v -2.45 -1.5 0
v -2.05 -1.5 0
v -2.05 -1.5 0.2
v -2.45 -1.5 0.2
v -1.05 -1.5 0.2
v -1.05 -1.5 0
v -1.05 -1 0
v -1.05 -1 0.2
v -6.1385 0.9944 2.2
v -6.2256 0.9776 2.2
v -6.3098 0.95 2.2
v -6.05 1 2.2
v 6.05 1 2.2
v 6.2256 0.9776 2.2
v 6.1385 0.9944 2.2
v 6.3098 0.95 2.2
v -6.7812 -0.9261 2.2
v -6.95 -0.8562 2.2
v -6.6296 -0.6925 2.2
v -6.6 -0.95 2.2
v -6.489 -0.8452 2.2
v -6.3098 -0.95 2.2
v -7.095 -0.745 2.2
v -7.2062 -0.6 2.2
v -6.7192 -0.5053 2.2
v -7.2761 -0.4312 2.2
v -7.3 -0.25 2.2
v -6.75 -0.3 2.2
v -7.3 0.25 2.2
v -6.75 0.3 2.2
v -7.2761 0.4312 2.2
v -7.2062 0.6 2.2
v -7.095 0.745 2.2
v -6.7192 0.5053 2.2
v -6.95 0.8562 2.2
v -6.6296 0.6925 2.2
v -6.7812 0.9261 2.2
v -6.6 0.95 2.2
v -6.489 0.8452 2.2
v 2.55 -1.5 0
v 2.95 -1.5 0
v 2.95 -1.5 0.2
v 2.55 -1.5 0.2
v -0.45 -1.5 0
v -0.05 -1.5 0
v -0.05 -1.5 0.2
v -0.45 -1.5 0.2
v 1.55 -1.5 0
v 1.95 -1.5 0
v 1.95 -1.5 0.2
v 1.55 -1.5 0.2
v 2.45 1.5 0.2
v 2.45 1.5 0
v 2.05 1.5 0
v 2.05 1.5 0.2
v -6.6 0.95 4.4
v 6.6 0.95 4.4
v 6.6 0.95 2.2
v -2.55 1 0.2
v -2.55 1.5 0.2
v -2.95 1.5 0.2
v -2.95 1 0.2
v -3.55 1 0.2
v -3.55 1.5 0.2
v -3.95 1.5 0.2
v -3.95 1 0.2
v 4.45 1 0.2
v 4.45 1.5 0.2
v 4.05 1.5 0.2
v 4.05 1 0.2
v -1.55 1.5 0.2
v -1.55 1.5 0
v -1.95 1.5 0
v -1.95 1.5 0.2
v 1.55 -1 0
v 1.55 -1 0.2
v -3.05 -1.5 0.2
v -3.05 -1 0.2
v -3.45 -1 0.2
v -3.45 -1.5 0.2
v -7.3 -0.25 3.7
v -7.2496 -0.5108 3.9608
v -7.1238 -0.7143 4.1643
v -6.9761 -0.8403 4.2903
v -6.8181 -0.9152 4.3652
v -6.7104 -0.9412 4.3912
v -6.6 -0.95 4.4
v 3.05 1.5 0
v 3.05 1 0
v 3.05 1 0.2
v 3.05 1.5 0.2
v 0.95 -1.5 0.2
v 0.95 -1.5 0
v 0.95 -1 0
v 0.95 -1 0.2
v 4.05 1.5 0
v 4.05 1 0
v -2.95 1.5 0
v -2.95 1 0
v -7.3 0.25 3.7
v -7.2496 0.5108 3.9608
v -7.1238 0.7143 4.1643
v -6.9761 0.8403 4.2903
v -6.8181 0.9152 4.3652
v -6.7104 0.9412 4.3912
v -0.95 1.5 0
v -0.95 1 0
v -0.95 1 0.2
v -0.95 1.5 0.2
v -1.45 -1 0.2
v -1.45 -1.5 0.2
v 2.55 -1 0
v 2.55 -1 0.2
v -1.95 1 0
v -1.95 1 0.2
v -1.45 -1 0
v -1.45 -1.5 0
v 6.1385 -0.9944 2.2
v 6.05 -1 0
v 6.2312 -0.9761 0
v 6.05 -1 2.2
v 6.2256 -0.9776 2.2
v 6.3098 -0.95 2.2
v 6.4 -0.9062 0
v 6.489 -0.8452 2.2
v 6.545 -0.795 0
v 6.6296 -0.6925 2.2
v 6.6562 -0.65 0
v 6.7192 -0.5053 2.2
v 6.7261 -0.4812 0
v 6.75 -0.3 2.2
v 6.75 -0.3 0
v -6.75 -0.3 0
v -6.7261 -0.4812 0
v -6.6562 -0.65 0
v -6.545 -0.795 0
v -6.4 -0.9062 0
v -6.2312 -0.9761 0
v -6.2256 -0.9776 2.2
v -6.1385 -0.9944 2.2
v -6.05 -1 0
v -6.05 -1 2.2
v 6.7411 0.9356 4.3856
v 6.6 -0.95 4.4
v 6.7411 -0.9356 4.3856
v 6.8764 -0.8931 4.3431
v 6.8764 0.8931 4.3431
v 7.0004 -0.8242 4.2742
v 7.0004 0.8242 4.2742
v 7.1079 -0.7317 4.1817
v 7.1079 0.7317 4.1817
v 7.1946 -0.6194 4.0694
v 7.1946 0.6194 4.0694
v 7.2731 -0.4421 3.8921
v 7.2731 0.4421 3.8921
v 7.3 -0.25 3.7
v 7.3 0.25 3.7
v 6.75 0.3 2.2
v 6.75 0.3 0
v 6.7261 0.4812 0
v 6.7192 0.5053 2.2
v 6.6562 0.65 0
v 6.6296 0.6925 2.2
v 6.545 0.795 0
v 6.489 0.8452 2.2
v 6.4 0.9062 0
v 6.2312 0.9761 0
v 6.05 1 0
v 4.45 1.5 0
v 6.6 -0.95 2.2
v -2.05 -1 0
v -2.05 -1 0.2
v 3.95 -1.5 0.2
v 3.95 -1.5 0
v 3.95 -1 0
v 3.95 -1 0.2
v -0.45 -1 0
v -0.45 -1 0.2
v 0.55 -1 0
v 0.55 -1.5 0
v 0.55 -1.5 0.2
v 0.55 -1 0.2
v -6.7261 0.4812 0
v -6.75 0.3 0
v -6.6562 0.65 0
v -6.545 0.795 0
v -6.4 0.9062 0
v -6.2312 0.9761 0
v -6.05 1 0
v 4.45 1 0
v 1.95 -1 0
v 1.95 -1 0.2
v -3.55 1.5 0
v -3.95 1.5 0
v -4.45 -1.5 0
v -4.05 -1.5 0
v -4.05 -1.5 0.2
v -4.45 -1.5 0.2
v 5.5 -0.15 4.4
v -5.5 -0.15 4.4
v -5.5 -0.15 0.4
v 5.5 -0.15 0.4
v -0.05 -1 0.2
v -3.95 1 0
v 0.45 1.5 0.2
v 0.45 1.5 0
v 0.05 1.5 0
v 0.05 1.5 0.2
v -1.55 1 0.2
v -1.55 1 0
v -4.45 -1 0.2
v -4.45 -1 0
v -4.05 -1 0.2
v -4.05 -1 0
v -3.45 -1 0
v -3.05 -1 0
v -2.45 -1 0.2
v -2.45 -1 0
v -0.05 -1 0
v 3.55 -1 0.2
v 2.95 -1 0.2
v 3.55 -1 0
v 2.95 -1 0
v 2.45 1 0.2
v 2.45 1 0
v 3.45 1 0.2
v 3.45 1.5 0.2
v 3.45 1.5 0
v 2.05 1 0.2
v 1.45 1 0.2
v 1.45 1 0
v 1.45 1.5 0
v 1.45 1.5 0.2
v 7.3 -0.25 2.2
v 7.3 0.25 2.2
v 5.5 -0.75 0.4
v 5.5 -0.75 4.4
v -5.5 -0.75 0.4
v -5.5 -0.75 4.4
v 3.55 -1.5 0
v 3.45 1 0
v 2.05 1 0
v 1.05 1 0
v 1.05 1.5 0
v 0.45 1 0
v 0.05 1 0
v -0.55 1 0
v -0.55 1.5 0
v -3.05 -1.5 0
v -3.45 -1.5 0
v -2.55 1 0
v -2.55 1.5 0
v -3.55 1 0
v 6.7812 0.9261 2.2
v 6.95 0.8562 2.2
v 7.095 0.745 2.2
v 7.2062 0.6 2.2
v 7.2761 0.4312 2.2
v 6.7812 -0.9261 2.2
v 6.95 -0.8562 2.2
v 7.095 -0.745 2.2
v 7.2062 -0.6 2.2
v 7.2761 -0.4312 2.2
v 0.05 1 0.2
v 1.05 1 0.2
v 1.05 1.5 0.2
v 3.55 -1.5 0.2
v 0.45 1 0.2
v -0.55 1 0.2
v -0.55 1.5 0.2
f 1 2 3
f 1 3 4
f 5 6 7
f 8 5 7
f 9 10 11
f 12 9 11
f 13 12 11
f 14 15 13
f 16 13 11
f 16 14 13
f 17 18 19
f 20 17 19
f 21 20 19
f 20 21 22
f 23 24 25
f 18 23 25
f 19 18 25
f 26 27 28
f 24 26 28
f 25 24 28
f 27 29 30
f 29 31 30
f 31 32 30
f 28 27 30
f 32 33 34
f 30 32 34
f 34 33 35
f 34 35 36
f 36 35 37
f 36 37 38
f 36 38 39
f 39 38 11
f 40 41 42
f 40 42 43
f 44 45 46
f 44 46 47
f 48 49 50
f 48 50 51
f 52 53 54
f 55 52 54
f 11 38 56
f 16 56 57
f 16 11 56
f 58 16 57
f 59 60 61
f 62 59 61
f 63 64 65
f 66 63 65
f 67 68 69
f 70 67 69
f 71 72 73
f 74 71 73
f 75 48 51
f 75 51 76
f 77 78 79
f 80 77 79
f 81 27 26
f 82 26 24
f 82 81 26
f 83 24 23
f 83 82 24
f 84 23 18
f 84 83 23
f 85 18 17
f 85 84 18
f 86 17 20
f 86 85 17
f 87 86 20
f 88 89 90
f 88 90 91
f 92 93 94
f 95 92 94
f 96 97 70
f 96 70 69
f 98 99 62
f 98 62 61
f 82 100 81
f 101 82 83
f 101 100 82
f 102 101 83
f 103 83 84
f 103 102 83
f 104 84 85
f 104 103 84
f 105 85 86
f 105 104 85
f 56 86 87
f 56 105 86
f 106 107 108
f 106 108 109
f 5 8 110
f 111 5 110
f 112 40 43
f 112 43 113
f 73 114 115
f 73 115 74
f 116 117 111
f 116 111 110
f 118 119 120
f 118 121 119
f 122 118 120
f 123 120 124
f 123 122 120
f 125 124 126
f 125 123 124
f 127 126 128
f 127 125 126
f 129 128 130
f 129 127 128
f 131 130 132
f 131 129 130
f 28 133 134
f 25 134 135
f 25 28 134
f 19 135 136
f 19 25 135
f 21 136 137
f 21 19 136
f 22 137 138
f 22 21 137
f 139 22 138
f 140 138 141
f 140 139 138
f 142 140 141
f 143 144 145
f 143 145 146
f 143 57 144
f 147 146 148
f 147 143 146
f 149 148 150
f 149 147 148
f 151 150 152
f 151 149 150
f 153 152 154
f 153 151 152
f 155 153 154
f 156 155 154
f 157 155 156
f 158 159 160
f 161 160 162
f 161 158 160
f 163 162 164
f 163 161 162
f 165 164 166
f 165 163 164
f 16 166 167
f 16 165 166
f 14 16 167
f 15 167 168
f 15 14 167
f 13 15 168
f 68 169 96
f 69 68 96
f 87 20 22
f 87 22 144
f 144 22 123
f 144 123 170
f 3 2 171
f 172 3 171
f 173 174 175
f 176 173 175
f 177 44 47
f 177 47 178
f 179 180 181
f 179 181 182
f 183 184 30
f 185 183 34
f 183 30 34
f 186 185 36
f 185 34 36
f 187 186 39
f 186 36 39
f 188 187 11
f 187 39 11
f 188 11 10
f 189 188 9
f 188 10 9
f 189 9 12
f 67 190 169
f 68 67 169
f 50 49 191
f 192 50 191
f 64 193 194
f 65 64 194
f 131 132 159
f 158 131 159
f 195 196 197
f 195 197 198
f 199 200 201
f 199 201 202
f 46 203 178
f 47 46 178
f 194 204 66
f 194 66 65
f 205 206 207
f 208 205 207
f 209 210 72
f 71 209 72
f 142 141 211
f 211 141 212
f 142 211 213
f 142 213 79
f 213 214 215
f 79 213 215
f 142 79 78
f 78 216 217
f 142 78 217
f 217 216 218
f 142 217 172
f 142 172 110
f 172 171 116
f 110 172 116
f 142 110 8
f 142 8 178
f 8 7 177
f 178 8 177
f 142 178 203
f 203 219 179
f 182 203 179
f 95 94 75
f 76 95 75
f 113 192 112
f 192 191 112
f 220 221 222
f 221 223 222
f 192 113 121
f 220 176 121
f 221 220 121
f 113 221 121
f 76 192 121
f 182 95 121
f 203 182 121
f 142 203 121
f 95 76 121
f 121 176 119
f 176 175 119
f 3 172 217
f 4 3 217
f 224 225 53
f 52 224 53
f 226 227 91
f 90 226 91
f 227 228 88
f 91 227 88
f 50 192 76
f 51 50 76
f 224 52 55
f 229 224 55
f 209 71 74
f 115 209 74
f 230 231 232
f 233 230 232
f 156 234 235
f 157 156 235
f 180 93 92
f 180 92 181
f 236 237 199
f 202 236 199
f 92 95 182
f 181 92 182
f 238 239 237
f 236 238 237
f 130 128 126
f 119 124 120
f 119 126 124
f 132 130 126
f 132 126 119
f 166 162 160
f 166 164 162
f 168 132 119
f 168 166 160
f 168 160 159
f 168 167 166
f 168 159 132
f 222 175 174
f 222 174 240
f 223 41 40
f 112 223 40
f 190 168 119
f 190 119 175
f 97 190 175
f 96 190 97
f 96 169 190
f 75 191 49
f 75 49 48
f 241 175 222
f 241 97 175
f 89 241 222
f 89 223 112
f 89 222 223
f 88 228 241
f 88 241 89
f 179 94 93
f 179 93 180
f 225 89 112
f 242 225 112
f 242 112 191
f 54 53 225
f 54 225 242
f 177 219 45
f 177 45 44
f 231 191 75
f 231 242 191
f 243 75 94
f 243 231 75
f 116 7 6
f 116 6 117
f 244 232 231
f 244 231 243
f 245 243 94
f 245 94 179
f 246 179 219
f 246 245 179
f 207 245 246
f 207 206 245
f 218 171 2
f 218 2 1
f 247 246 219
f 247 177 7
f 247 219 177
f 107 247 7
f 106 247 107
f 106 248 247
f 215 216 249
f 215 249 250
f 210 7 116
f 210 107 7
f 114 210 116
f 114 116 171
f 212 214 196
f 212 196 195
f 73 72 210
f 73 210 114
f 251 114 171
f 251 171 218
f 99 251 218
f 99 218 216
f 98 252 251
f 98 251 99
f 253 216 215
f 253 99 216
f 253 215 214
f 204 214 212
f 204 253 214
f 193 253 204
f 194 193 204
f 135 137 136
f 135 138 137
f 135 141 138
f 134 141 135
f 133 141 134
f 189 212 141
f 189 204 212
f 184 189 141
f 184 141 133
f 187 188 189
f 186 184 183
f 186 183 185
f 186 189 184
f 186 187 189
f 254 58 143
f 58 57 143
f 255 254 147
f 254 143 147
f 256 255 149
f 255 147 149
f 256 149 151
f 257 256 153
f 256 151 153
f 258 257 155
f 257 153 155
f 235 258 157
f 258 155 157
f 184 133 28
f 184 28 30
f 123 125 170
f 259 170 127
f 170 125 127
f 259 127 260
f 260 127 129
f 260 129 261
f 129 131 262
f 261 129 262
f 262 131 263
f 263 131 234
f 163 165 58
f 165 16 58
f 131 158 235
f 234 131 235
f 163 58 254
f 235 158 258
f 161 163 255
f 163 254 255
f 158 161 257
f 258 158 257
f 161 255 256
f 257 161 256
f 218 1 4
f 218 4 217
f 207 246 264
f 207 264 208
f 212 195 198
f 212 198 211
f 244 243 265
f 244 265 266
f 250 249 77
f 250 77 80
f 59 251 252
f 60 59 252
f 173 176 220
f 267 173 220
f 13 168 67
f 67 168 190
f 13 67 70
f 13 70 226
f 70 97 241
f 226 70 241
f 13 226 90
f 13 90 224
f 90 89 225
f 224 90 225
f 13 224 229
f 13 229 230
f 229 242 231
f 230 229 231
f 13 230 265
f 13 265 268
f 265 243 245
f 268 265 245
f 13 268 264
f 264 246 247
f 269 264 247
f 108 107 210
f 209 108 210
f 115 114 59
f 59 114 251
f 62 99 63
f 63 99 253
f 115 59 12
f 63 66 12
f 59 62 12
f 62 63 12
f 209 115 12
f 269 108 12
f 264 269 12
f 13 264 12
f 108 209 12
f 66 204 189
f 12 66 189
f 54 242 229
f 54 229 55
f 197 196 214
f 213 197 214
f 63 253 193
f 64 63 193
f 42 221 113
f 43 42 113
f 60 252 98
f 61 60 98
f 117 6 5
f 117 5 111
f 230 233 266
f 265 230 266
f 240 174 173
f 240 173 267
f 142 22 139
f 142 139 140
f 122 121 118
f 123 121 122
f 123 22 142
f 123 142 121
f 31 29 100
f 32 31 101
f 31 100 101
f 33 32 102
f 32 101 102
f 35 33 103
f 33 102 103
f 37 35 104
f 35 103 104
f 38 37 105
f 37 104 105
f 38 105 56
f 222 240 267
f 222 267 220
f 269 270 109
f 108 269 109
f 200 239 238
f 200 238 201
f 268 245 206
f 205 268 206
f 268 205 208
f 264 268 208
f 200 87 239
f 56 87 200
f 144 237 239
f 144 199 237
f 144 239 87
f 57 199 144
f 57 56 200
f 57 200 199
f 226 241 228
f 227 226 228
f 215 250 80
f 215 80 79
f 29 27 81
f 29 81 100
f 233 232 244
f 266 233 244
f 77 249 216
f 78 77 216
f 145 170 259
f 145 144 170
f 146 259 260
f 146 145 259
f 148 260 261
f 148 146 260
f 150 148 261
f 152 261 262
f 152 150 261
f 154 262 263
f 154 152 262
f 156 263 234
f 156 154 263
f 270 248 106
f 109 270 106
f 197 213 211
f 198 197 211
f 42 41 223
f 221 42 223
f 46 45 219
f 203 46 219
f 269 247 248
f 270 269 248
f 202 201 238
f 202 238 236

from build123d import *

# Parameters (mm, degrees)
SKETCH1_W           = 13.5
SKETCH1_H           = 2
BOSS_EXTRUDE1_DEPTH = 2.2
FILLET1_R           = 0.7
SKETCH2_W           = 14.6
SKETCH2_H           = 1.9
BOSS_EXTRUDE2_DEPTH = 2.2
FILLET2_R           = 0.7
SKETCH3_W           = 11
SKETCH3_H           = 0.6
CUT_EXTRUDE1_DEPTH  = 4
SKETCH4_W           = 0.4
SKETCH4_H           = 2.5
BOSS_EXTRUDE3_DEPTH = 0.2


with BuildPart() as part:
    # Sketch1 → Boss-Extrude1 (new body)
    with BuildSketch(Plane.XY):
        Rectangle(SKETCH1_W, SKETCH1_H)
    extrude(amount=BOSS_EXTRUDE1_DEPTH)

    # Fillet1
    fillet1_edges = [part.edges().sort_by_distance(p)[0] for p in [
        (6.75, -1, 1.1),
        (-6.75, -1, 1.1),
        (-6.75, 1, 1.1),
        (6.75, 1, 1.1),
    ]]
    fillet(fillet1_edges, radius=FILLET1_R)

    # Sketch2 → Boss-Extrude2 (add)
    with BuildSketch(Plane.XY.offset(2.2)):
        Rectangle(SKETCH2_W, SKETCH2_H)
    extrude(amount=BOSS_EXTRUDE2_DEPTH)

    # Fillet2
    fillet2_edges = [part.edges().sort_by_distance(p)[0] for p in [
        (7.3, 0.95, 3.3),
        (7.3, 0, 4.4),
        (7.3, -0.95, 3.3),
        (-7.3, -0.95, 3.3),
        (-7.3, 0, 4.4),
        (-7.3, 0.95, 3.3),
    ]]
    fillet(fillet2_edges, radius=FILLET2_R)

    # Sketch3 → Cut-Extrude1 (cut)
    with BuildSketch(Plane.XY.offset(4.4)):
        with Locations((0, -0.45)):
            Rectangle(SKETCH3_W, SKETCH3_H)
    extrude(amount=-CUT_EXTRUDE1_DEPTH, mode=Mode.SUBTRACT)

    # Sketch4 → Boss-Extrude3 (add)
    with BuildSketch(Plane(origin=(0, 0, 0), x_dir=(-1, 0, 0), z_dir=(0, 0, -1))):
        with Locations((4.25, -0.25)):
            Rectangle(SKETCH4_W, SKETCH4_H)
        with Locations((3.25, -0.25)):
            Rectangle(SKETCH4_W, SKETCH4_H)
        with Locations((2.25, -0.25)):
            Rectangle(SKETCH4_W, SKETCH4_H)
        with Locations((1.25, -0.25)):
            Rectangle(SKETCH4_W, SKETCH4_H)
        with Locations((0.25, -0.25)):
            Rectangle(SKETCH4_W, SKETCH4_H)
        with Locations((-0.75, -0.25)):
            Rectangle(SKETCH4_W, SKETCH4_H)
        with Locations((-1.75, -0.25)):
            Rectangle(SKETCH4_W, SKETCH4_H)
        with Locations((-2.75, -0.25)):
            Rectangle(SKETCH4_W, SKETCH4_H)
        with Locations((-3.75, -0.25)):
            Rectangle(SKETCH4_W, SKETCH4_H)
        with Locations((3.75, 0.25)):
            Rectangle(SKETCH4_W, SKETCH4_H)
        with Locations((2.75, 0.25)):
            Rectangle(SKETCH4_W, SKETCH4_H)
        with Locations((1.75, 0.25)):
            Rectangle(SKETCH4_W, SKETCH4_H)
        with Locations((0.75, 0.25)):
            Rectangle(SKETCH4_W, SKETCH4_H)
        with Locations((-0.25, 0.25)):
            Rectangle(SKETCH4_W, SKETCH4_H)
        with Locations((-1.25, 0.25)):
            Rectangle(SKETCH4_W, SKETCH4_H)
        with Locations((-2.25, 0.25)):
            Rectangle(SKETCH4_W, SKETCH4_H)
        with Locations((-3.25, 0.25)):
            Rectangle(SKETCH4_W, SKETCH4_H)
        with Locations((-4.25, 0.25)):
            Rectangle(SKETCH4_W, SKETCH4_H)
    extrude(amount=-BOSS_EXTRUDE3_DEPTH)


solid = part.part
